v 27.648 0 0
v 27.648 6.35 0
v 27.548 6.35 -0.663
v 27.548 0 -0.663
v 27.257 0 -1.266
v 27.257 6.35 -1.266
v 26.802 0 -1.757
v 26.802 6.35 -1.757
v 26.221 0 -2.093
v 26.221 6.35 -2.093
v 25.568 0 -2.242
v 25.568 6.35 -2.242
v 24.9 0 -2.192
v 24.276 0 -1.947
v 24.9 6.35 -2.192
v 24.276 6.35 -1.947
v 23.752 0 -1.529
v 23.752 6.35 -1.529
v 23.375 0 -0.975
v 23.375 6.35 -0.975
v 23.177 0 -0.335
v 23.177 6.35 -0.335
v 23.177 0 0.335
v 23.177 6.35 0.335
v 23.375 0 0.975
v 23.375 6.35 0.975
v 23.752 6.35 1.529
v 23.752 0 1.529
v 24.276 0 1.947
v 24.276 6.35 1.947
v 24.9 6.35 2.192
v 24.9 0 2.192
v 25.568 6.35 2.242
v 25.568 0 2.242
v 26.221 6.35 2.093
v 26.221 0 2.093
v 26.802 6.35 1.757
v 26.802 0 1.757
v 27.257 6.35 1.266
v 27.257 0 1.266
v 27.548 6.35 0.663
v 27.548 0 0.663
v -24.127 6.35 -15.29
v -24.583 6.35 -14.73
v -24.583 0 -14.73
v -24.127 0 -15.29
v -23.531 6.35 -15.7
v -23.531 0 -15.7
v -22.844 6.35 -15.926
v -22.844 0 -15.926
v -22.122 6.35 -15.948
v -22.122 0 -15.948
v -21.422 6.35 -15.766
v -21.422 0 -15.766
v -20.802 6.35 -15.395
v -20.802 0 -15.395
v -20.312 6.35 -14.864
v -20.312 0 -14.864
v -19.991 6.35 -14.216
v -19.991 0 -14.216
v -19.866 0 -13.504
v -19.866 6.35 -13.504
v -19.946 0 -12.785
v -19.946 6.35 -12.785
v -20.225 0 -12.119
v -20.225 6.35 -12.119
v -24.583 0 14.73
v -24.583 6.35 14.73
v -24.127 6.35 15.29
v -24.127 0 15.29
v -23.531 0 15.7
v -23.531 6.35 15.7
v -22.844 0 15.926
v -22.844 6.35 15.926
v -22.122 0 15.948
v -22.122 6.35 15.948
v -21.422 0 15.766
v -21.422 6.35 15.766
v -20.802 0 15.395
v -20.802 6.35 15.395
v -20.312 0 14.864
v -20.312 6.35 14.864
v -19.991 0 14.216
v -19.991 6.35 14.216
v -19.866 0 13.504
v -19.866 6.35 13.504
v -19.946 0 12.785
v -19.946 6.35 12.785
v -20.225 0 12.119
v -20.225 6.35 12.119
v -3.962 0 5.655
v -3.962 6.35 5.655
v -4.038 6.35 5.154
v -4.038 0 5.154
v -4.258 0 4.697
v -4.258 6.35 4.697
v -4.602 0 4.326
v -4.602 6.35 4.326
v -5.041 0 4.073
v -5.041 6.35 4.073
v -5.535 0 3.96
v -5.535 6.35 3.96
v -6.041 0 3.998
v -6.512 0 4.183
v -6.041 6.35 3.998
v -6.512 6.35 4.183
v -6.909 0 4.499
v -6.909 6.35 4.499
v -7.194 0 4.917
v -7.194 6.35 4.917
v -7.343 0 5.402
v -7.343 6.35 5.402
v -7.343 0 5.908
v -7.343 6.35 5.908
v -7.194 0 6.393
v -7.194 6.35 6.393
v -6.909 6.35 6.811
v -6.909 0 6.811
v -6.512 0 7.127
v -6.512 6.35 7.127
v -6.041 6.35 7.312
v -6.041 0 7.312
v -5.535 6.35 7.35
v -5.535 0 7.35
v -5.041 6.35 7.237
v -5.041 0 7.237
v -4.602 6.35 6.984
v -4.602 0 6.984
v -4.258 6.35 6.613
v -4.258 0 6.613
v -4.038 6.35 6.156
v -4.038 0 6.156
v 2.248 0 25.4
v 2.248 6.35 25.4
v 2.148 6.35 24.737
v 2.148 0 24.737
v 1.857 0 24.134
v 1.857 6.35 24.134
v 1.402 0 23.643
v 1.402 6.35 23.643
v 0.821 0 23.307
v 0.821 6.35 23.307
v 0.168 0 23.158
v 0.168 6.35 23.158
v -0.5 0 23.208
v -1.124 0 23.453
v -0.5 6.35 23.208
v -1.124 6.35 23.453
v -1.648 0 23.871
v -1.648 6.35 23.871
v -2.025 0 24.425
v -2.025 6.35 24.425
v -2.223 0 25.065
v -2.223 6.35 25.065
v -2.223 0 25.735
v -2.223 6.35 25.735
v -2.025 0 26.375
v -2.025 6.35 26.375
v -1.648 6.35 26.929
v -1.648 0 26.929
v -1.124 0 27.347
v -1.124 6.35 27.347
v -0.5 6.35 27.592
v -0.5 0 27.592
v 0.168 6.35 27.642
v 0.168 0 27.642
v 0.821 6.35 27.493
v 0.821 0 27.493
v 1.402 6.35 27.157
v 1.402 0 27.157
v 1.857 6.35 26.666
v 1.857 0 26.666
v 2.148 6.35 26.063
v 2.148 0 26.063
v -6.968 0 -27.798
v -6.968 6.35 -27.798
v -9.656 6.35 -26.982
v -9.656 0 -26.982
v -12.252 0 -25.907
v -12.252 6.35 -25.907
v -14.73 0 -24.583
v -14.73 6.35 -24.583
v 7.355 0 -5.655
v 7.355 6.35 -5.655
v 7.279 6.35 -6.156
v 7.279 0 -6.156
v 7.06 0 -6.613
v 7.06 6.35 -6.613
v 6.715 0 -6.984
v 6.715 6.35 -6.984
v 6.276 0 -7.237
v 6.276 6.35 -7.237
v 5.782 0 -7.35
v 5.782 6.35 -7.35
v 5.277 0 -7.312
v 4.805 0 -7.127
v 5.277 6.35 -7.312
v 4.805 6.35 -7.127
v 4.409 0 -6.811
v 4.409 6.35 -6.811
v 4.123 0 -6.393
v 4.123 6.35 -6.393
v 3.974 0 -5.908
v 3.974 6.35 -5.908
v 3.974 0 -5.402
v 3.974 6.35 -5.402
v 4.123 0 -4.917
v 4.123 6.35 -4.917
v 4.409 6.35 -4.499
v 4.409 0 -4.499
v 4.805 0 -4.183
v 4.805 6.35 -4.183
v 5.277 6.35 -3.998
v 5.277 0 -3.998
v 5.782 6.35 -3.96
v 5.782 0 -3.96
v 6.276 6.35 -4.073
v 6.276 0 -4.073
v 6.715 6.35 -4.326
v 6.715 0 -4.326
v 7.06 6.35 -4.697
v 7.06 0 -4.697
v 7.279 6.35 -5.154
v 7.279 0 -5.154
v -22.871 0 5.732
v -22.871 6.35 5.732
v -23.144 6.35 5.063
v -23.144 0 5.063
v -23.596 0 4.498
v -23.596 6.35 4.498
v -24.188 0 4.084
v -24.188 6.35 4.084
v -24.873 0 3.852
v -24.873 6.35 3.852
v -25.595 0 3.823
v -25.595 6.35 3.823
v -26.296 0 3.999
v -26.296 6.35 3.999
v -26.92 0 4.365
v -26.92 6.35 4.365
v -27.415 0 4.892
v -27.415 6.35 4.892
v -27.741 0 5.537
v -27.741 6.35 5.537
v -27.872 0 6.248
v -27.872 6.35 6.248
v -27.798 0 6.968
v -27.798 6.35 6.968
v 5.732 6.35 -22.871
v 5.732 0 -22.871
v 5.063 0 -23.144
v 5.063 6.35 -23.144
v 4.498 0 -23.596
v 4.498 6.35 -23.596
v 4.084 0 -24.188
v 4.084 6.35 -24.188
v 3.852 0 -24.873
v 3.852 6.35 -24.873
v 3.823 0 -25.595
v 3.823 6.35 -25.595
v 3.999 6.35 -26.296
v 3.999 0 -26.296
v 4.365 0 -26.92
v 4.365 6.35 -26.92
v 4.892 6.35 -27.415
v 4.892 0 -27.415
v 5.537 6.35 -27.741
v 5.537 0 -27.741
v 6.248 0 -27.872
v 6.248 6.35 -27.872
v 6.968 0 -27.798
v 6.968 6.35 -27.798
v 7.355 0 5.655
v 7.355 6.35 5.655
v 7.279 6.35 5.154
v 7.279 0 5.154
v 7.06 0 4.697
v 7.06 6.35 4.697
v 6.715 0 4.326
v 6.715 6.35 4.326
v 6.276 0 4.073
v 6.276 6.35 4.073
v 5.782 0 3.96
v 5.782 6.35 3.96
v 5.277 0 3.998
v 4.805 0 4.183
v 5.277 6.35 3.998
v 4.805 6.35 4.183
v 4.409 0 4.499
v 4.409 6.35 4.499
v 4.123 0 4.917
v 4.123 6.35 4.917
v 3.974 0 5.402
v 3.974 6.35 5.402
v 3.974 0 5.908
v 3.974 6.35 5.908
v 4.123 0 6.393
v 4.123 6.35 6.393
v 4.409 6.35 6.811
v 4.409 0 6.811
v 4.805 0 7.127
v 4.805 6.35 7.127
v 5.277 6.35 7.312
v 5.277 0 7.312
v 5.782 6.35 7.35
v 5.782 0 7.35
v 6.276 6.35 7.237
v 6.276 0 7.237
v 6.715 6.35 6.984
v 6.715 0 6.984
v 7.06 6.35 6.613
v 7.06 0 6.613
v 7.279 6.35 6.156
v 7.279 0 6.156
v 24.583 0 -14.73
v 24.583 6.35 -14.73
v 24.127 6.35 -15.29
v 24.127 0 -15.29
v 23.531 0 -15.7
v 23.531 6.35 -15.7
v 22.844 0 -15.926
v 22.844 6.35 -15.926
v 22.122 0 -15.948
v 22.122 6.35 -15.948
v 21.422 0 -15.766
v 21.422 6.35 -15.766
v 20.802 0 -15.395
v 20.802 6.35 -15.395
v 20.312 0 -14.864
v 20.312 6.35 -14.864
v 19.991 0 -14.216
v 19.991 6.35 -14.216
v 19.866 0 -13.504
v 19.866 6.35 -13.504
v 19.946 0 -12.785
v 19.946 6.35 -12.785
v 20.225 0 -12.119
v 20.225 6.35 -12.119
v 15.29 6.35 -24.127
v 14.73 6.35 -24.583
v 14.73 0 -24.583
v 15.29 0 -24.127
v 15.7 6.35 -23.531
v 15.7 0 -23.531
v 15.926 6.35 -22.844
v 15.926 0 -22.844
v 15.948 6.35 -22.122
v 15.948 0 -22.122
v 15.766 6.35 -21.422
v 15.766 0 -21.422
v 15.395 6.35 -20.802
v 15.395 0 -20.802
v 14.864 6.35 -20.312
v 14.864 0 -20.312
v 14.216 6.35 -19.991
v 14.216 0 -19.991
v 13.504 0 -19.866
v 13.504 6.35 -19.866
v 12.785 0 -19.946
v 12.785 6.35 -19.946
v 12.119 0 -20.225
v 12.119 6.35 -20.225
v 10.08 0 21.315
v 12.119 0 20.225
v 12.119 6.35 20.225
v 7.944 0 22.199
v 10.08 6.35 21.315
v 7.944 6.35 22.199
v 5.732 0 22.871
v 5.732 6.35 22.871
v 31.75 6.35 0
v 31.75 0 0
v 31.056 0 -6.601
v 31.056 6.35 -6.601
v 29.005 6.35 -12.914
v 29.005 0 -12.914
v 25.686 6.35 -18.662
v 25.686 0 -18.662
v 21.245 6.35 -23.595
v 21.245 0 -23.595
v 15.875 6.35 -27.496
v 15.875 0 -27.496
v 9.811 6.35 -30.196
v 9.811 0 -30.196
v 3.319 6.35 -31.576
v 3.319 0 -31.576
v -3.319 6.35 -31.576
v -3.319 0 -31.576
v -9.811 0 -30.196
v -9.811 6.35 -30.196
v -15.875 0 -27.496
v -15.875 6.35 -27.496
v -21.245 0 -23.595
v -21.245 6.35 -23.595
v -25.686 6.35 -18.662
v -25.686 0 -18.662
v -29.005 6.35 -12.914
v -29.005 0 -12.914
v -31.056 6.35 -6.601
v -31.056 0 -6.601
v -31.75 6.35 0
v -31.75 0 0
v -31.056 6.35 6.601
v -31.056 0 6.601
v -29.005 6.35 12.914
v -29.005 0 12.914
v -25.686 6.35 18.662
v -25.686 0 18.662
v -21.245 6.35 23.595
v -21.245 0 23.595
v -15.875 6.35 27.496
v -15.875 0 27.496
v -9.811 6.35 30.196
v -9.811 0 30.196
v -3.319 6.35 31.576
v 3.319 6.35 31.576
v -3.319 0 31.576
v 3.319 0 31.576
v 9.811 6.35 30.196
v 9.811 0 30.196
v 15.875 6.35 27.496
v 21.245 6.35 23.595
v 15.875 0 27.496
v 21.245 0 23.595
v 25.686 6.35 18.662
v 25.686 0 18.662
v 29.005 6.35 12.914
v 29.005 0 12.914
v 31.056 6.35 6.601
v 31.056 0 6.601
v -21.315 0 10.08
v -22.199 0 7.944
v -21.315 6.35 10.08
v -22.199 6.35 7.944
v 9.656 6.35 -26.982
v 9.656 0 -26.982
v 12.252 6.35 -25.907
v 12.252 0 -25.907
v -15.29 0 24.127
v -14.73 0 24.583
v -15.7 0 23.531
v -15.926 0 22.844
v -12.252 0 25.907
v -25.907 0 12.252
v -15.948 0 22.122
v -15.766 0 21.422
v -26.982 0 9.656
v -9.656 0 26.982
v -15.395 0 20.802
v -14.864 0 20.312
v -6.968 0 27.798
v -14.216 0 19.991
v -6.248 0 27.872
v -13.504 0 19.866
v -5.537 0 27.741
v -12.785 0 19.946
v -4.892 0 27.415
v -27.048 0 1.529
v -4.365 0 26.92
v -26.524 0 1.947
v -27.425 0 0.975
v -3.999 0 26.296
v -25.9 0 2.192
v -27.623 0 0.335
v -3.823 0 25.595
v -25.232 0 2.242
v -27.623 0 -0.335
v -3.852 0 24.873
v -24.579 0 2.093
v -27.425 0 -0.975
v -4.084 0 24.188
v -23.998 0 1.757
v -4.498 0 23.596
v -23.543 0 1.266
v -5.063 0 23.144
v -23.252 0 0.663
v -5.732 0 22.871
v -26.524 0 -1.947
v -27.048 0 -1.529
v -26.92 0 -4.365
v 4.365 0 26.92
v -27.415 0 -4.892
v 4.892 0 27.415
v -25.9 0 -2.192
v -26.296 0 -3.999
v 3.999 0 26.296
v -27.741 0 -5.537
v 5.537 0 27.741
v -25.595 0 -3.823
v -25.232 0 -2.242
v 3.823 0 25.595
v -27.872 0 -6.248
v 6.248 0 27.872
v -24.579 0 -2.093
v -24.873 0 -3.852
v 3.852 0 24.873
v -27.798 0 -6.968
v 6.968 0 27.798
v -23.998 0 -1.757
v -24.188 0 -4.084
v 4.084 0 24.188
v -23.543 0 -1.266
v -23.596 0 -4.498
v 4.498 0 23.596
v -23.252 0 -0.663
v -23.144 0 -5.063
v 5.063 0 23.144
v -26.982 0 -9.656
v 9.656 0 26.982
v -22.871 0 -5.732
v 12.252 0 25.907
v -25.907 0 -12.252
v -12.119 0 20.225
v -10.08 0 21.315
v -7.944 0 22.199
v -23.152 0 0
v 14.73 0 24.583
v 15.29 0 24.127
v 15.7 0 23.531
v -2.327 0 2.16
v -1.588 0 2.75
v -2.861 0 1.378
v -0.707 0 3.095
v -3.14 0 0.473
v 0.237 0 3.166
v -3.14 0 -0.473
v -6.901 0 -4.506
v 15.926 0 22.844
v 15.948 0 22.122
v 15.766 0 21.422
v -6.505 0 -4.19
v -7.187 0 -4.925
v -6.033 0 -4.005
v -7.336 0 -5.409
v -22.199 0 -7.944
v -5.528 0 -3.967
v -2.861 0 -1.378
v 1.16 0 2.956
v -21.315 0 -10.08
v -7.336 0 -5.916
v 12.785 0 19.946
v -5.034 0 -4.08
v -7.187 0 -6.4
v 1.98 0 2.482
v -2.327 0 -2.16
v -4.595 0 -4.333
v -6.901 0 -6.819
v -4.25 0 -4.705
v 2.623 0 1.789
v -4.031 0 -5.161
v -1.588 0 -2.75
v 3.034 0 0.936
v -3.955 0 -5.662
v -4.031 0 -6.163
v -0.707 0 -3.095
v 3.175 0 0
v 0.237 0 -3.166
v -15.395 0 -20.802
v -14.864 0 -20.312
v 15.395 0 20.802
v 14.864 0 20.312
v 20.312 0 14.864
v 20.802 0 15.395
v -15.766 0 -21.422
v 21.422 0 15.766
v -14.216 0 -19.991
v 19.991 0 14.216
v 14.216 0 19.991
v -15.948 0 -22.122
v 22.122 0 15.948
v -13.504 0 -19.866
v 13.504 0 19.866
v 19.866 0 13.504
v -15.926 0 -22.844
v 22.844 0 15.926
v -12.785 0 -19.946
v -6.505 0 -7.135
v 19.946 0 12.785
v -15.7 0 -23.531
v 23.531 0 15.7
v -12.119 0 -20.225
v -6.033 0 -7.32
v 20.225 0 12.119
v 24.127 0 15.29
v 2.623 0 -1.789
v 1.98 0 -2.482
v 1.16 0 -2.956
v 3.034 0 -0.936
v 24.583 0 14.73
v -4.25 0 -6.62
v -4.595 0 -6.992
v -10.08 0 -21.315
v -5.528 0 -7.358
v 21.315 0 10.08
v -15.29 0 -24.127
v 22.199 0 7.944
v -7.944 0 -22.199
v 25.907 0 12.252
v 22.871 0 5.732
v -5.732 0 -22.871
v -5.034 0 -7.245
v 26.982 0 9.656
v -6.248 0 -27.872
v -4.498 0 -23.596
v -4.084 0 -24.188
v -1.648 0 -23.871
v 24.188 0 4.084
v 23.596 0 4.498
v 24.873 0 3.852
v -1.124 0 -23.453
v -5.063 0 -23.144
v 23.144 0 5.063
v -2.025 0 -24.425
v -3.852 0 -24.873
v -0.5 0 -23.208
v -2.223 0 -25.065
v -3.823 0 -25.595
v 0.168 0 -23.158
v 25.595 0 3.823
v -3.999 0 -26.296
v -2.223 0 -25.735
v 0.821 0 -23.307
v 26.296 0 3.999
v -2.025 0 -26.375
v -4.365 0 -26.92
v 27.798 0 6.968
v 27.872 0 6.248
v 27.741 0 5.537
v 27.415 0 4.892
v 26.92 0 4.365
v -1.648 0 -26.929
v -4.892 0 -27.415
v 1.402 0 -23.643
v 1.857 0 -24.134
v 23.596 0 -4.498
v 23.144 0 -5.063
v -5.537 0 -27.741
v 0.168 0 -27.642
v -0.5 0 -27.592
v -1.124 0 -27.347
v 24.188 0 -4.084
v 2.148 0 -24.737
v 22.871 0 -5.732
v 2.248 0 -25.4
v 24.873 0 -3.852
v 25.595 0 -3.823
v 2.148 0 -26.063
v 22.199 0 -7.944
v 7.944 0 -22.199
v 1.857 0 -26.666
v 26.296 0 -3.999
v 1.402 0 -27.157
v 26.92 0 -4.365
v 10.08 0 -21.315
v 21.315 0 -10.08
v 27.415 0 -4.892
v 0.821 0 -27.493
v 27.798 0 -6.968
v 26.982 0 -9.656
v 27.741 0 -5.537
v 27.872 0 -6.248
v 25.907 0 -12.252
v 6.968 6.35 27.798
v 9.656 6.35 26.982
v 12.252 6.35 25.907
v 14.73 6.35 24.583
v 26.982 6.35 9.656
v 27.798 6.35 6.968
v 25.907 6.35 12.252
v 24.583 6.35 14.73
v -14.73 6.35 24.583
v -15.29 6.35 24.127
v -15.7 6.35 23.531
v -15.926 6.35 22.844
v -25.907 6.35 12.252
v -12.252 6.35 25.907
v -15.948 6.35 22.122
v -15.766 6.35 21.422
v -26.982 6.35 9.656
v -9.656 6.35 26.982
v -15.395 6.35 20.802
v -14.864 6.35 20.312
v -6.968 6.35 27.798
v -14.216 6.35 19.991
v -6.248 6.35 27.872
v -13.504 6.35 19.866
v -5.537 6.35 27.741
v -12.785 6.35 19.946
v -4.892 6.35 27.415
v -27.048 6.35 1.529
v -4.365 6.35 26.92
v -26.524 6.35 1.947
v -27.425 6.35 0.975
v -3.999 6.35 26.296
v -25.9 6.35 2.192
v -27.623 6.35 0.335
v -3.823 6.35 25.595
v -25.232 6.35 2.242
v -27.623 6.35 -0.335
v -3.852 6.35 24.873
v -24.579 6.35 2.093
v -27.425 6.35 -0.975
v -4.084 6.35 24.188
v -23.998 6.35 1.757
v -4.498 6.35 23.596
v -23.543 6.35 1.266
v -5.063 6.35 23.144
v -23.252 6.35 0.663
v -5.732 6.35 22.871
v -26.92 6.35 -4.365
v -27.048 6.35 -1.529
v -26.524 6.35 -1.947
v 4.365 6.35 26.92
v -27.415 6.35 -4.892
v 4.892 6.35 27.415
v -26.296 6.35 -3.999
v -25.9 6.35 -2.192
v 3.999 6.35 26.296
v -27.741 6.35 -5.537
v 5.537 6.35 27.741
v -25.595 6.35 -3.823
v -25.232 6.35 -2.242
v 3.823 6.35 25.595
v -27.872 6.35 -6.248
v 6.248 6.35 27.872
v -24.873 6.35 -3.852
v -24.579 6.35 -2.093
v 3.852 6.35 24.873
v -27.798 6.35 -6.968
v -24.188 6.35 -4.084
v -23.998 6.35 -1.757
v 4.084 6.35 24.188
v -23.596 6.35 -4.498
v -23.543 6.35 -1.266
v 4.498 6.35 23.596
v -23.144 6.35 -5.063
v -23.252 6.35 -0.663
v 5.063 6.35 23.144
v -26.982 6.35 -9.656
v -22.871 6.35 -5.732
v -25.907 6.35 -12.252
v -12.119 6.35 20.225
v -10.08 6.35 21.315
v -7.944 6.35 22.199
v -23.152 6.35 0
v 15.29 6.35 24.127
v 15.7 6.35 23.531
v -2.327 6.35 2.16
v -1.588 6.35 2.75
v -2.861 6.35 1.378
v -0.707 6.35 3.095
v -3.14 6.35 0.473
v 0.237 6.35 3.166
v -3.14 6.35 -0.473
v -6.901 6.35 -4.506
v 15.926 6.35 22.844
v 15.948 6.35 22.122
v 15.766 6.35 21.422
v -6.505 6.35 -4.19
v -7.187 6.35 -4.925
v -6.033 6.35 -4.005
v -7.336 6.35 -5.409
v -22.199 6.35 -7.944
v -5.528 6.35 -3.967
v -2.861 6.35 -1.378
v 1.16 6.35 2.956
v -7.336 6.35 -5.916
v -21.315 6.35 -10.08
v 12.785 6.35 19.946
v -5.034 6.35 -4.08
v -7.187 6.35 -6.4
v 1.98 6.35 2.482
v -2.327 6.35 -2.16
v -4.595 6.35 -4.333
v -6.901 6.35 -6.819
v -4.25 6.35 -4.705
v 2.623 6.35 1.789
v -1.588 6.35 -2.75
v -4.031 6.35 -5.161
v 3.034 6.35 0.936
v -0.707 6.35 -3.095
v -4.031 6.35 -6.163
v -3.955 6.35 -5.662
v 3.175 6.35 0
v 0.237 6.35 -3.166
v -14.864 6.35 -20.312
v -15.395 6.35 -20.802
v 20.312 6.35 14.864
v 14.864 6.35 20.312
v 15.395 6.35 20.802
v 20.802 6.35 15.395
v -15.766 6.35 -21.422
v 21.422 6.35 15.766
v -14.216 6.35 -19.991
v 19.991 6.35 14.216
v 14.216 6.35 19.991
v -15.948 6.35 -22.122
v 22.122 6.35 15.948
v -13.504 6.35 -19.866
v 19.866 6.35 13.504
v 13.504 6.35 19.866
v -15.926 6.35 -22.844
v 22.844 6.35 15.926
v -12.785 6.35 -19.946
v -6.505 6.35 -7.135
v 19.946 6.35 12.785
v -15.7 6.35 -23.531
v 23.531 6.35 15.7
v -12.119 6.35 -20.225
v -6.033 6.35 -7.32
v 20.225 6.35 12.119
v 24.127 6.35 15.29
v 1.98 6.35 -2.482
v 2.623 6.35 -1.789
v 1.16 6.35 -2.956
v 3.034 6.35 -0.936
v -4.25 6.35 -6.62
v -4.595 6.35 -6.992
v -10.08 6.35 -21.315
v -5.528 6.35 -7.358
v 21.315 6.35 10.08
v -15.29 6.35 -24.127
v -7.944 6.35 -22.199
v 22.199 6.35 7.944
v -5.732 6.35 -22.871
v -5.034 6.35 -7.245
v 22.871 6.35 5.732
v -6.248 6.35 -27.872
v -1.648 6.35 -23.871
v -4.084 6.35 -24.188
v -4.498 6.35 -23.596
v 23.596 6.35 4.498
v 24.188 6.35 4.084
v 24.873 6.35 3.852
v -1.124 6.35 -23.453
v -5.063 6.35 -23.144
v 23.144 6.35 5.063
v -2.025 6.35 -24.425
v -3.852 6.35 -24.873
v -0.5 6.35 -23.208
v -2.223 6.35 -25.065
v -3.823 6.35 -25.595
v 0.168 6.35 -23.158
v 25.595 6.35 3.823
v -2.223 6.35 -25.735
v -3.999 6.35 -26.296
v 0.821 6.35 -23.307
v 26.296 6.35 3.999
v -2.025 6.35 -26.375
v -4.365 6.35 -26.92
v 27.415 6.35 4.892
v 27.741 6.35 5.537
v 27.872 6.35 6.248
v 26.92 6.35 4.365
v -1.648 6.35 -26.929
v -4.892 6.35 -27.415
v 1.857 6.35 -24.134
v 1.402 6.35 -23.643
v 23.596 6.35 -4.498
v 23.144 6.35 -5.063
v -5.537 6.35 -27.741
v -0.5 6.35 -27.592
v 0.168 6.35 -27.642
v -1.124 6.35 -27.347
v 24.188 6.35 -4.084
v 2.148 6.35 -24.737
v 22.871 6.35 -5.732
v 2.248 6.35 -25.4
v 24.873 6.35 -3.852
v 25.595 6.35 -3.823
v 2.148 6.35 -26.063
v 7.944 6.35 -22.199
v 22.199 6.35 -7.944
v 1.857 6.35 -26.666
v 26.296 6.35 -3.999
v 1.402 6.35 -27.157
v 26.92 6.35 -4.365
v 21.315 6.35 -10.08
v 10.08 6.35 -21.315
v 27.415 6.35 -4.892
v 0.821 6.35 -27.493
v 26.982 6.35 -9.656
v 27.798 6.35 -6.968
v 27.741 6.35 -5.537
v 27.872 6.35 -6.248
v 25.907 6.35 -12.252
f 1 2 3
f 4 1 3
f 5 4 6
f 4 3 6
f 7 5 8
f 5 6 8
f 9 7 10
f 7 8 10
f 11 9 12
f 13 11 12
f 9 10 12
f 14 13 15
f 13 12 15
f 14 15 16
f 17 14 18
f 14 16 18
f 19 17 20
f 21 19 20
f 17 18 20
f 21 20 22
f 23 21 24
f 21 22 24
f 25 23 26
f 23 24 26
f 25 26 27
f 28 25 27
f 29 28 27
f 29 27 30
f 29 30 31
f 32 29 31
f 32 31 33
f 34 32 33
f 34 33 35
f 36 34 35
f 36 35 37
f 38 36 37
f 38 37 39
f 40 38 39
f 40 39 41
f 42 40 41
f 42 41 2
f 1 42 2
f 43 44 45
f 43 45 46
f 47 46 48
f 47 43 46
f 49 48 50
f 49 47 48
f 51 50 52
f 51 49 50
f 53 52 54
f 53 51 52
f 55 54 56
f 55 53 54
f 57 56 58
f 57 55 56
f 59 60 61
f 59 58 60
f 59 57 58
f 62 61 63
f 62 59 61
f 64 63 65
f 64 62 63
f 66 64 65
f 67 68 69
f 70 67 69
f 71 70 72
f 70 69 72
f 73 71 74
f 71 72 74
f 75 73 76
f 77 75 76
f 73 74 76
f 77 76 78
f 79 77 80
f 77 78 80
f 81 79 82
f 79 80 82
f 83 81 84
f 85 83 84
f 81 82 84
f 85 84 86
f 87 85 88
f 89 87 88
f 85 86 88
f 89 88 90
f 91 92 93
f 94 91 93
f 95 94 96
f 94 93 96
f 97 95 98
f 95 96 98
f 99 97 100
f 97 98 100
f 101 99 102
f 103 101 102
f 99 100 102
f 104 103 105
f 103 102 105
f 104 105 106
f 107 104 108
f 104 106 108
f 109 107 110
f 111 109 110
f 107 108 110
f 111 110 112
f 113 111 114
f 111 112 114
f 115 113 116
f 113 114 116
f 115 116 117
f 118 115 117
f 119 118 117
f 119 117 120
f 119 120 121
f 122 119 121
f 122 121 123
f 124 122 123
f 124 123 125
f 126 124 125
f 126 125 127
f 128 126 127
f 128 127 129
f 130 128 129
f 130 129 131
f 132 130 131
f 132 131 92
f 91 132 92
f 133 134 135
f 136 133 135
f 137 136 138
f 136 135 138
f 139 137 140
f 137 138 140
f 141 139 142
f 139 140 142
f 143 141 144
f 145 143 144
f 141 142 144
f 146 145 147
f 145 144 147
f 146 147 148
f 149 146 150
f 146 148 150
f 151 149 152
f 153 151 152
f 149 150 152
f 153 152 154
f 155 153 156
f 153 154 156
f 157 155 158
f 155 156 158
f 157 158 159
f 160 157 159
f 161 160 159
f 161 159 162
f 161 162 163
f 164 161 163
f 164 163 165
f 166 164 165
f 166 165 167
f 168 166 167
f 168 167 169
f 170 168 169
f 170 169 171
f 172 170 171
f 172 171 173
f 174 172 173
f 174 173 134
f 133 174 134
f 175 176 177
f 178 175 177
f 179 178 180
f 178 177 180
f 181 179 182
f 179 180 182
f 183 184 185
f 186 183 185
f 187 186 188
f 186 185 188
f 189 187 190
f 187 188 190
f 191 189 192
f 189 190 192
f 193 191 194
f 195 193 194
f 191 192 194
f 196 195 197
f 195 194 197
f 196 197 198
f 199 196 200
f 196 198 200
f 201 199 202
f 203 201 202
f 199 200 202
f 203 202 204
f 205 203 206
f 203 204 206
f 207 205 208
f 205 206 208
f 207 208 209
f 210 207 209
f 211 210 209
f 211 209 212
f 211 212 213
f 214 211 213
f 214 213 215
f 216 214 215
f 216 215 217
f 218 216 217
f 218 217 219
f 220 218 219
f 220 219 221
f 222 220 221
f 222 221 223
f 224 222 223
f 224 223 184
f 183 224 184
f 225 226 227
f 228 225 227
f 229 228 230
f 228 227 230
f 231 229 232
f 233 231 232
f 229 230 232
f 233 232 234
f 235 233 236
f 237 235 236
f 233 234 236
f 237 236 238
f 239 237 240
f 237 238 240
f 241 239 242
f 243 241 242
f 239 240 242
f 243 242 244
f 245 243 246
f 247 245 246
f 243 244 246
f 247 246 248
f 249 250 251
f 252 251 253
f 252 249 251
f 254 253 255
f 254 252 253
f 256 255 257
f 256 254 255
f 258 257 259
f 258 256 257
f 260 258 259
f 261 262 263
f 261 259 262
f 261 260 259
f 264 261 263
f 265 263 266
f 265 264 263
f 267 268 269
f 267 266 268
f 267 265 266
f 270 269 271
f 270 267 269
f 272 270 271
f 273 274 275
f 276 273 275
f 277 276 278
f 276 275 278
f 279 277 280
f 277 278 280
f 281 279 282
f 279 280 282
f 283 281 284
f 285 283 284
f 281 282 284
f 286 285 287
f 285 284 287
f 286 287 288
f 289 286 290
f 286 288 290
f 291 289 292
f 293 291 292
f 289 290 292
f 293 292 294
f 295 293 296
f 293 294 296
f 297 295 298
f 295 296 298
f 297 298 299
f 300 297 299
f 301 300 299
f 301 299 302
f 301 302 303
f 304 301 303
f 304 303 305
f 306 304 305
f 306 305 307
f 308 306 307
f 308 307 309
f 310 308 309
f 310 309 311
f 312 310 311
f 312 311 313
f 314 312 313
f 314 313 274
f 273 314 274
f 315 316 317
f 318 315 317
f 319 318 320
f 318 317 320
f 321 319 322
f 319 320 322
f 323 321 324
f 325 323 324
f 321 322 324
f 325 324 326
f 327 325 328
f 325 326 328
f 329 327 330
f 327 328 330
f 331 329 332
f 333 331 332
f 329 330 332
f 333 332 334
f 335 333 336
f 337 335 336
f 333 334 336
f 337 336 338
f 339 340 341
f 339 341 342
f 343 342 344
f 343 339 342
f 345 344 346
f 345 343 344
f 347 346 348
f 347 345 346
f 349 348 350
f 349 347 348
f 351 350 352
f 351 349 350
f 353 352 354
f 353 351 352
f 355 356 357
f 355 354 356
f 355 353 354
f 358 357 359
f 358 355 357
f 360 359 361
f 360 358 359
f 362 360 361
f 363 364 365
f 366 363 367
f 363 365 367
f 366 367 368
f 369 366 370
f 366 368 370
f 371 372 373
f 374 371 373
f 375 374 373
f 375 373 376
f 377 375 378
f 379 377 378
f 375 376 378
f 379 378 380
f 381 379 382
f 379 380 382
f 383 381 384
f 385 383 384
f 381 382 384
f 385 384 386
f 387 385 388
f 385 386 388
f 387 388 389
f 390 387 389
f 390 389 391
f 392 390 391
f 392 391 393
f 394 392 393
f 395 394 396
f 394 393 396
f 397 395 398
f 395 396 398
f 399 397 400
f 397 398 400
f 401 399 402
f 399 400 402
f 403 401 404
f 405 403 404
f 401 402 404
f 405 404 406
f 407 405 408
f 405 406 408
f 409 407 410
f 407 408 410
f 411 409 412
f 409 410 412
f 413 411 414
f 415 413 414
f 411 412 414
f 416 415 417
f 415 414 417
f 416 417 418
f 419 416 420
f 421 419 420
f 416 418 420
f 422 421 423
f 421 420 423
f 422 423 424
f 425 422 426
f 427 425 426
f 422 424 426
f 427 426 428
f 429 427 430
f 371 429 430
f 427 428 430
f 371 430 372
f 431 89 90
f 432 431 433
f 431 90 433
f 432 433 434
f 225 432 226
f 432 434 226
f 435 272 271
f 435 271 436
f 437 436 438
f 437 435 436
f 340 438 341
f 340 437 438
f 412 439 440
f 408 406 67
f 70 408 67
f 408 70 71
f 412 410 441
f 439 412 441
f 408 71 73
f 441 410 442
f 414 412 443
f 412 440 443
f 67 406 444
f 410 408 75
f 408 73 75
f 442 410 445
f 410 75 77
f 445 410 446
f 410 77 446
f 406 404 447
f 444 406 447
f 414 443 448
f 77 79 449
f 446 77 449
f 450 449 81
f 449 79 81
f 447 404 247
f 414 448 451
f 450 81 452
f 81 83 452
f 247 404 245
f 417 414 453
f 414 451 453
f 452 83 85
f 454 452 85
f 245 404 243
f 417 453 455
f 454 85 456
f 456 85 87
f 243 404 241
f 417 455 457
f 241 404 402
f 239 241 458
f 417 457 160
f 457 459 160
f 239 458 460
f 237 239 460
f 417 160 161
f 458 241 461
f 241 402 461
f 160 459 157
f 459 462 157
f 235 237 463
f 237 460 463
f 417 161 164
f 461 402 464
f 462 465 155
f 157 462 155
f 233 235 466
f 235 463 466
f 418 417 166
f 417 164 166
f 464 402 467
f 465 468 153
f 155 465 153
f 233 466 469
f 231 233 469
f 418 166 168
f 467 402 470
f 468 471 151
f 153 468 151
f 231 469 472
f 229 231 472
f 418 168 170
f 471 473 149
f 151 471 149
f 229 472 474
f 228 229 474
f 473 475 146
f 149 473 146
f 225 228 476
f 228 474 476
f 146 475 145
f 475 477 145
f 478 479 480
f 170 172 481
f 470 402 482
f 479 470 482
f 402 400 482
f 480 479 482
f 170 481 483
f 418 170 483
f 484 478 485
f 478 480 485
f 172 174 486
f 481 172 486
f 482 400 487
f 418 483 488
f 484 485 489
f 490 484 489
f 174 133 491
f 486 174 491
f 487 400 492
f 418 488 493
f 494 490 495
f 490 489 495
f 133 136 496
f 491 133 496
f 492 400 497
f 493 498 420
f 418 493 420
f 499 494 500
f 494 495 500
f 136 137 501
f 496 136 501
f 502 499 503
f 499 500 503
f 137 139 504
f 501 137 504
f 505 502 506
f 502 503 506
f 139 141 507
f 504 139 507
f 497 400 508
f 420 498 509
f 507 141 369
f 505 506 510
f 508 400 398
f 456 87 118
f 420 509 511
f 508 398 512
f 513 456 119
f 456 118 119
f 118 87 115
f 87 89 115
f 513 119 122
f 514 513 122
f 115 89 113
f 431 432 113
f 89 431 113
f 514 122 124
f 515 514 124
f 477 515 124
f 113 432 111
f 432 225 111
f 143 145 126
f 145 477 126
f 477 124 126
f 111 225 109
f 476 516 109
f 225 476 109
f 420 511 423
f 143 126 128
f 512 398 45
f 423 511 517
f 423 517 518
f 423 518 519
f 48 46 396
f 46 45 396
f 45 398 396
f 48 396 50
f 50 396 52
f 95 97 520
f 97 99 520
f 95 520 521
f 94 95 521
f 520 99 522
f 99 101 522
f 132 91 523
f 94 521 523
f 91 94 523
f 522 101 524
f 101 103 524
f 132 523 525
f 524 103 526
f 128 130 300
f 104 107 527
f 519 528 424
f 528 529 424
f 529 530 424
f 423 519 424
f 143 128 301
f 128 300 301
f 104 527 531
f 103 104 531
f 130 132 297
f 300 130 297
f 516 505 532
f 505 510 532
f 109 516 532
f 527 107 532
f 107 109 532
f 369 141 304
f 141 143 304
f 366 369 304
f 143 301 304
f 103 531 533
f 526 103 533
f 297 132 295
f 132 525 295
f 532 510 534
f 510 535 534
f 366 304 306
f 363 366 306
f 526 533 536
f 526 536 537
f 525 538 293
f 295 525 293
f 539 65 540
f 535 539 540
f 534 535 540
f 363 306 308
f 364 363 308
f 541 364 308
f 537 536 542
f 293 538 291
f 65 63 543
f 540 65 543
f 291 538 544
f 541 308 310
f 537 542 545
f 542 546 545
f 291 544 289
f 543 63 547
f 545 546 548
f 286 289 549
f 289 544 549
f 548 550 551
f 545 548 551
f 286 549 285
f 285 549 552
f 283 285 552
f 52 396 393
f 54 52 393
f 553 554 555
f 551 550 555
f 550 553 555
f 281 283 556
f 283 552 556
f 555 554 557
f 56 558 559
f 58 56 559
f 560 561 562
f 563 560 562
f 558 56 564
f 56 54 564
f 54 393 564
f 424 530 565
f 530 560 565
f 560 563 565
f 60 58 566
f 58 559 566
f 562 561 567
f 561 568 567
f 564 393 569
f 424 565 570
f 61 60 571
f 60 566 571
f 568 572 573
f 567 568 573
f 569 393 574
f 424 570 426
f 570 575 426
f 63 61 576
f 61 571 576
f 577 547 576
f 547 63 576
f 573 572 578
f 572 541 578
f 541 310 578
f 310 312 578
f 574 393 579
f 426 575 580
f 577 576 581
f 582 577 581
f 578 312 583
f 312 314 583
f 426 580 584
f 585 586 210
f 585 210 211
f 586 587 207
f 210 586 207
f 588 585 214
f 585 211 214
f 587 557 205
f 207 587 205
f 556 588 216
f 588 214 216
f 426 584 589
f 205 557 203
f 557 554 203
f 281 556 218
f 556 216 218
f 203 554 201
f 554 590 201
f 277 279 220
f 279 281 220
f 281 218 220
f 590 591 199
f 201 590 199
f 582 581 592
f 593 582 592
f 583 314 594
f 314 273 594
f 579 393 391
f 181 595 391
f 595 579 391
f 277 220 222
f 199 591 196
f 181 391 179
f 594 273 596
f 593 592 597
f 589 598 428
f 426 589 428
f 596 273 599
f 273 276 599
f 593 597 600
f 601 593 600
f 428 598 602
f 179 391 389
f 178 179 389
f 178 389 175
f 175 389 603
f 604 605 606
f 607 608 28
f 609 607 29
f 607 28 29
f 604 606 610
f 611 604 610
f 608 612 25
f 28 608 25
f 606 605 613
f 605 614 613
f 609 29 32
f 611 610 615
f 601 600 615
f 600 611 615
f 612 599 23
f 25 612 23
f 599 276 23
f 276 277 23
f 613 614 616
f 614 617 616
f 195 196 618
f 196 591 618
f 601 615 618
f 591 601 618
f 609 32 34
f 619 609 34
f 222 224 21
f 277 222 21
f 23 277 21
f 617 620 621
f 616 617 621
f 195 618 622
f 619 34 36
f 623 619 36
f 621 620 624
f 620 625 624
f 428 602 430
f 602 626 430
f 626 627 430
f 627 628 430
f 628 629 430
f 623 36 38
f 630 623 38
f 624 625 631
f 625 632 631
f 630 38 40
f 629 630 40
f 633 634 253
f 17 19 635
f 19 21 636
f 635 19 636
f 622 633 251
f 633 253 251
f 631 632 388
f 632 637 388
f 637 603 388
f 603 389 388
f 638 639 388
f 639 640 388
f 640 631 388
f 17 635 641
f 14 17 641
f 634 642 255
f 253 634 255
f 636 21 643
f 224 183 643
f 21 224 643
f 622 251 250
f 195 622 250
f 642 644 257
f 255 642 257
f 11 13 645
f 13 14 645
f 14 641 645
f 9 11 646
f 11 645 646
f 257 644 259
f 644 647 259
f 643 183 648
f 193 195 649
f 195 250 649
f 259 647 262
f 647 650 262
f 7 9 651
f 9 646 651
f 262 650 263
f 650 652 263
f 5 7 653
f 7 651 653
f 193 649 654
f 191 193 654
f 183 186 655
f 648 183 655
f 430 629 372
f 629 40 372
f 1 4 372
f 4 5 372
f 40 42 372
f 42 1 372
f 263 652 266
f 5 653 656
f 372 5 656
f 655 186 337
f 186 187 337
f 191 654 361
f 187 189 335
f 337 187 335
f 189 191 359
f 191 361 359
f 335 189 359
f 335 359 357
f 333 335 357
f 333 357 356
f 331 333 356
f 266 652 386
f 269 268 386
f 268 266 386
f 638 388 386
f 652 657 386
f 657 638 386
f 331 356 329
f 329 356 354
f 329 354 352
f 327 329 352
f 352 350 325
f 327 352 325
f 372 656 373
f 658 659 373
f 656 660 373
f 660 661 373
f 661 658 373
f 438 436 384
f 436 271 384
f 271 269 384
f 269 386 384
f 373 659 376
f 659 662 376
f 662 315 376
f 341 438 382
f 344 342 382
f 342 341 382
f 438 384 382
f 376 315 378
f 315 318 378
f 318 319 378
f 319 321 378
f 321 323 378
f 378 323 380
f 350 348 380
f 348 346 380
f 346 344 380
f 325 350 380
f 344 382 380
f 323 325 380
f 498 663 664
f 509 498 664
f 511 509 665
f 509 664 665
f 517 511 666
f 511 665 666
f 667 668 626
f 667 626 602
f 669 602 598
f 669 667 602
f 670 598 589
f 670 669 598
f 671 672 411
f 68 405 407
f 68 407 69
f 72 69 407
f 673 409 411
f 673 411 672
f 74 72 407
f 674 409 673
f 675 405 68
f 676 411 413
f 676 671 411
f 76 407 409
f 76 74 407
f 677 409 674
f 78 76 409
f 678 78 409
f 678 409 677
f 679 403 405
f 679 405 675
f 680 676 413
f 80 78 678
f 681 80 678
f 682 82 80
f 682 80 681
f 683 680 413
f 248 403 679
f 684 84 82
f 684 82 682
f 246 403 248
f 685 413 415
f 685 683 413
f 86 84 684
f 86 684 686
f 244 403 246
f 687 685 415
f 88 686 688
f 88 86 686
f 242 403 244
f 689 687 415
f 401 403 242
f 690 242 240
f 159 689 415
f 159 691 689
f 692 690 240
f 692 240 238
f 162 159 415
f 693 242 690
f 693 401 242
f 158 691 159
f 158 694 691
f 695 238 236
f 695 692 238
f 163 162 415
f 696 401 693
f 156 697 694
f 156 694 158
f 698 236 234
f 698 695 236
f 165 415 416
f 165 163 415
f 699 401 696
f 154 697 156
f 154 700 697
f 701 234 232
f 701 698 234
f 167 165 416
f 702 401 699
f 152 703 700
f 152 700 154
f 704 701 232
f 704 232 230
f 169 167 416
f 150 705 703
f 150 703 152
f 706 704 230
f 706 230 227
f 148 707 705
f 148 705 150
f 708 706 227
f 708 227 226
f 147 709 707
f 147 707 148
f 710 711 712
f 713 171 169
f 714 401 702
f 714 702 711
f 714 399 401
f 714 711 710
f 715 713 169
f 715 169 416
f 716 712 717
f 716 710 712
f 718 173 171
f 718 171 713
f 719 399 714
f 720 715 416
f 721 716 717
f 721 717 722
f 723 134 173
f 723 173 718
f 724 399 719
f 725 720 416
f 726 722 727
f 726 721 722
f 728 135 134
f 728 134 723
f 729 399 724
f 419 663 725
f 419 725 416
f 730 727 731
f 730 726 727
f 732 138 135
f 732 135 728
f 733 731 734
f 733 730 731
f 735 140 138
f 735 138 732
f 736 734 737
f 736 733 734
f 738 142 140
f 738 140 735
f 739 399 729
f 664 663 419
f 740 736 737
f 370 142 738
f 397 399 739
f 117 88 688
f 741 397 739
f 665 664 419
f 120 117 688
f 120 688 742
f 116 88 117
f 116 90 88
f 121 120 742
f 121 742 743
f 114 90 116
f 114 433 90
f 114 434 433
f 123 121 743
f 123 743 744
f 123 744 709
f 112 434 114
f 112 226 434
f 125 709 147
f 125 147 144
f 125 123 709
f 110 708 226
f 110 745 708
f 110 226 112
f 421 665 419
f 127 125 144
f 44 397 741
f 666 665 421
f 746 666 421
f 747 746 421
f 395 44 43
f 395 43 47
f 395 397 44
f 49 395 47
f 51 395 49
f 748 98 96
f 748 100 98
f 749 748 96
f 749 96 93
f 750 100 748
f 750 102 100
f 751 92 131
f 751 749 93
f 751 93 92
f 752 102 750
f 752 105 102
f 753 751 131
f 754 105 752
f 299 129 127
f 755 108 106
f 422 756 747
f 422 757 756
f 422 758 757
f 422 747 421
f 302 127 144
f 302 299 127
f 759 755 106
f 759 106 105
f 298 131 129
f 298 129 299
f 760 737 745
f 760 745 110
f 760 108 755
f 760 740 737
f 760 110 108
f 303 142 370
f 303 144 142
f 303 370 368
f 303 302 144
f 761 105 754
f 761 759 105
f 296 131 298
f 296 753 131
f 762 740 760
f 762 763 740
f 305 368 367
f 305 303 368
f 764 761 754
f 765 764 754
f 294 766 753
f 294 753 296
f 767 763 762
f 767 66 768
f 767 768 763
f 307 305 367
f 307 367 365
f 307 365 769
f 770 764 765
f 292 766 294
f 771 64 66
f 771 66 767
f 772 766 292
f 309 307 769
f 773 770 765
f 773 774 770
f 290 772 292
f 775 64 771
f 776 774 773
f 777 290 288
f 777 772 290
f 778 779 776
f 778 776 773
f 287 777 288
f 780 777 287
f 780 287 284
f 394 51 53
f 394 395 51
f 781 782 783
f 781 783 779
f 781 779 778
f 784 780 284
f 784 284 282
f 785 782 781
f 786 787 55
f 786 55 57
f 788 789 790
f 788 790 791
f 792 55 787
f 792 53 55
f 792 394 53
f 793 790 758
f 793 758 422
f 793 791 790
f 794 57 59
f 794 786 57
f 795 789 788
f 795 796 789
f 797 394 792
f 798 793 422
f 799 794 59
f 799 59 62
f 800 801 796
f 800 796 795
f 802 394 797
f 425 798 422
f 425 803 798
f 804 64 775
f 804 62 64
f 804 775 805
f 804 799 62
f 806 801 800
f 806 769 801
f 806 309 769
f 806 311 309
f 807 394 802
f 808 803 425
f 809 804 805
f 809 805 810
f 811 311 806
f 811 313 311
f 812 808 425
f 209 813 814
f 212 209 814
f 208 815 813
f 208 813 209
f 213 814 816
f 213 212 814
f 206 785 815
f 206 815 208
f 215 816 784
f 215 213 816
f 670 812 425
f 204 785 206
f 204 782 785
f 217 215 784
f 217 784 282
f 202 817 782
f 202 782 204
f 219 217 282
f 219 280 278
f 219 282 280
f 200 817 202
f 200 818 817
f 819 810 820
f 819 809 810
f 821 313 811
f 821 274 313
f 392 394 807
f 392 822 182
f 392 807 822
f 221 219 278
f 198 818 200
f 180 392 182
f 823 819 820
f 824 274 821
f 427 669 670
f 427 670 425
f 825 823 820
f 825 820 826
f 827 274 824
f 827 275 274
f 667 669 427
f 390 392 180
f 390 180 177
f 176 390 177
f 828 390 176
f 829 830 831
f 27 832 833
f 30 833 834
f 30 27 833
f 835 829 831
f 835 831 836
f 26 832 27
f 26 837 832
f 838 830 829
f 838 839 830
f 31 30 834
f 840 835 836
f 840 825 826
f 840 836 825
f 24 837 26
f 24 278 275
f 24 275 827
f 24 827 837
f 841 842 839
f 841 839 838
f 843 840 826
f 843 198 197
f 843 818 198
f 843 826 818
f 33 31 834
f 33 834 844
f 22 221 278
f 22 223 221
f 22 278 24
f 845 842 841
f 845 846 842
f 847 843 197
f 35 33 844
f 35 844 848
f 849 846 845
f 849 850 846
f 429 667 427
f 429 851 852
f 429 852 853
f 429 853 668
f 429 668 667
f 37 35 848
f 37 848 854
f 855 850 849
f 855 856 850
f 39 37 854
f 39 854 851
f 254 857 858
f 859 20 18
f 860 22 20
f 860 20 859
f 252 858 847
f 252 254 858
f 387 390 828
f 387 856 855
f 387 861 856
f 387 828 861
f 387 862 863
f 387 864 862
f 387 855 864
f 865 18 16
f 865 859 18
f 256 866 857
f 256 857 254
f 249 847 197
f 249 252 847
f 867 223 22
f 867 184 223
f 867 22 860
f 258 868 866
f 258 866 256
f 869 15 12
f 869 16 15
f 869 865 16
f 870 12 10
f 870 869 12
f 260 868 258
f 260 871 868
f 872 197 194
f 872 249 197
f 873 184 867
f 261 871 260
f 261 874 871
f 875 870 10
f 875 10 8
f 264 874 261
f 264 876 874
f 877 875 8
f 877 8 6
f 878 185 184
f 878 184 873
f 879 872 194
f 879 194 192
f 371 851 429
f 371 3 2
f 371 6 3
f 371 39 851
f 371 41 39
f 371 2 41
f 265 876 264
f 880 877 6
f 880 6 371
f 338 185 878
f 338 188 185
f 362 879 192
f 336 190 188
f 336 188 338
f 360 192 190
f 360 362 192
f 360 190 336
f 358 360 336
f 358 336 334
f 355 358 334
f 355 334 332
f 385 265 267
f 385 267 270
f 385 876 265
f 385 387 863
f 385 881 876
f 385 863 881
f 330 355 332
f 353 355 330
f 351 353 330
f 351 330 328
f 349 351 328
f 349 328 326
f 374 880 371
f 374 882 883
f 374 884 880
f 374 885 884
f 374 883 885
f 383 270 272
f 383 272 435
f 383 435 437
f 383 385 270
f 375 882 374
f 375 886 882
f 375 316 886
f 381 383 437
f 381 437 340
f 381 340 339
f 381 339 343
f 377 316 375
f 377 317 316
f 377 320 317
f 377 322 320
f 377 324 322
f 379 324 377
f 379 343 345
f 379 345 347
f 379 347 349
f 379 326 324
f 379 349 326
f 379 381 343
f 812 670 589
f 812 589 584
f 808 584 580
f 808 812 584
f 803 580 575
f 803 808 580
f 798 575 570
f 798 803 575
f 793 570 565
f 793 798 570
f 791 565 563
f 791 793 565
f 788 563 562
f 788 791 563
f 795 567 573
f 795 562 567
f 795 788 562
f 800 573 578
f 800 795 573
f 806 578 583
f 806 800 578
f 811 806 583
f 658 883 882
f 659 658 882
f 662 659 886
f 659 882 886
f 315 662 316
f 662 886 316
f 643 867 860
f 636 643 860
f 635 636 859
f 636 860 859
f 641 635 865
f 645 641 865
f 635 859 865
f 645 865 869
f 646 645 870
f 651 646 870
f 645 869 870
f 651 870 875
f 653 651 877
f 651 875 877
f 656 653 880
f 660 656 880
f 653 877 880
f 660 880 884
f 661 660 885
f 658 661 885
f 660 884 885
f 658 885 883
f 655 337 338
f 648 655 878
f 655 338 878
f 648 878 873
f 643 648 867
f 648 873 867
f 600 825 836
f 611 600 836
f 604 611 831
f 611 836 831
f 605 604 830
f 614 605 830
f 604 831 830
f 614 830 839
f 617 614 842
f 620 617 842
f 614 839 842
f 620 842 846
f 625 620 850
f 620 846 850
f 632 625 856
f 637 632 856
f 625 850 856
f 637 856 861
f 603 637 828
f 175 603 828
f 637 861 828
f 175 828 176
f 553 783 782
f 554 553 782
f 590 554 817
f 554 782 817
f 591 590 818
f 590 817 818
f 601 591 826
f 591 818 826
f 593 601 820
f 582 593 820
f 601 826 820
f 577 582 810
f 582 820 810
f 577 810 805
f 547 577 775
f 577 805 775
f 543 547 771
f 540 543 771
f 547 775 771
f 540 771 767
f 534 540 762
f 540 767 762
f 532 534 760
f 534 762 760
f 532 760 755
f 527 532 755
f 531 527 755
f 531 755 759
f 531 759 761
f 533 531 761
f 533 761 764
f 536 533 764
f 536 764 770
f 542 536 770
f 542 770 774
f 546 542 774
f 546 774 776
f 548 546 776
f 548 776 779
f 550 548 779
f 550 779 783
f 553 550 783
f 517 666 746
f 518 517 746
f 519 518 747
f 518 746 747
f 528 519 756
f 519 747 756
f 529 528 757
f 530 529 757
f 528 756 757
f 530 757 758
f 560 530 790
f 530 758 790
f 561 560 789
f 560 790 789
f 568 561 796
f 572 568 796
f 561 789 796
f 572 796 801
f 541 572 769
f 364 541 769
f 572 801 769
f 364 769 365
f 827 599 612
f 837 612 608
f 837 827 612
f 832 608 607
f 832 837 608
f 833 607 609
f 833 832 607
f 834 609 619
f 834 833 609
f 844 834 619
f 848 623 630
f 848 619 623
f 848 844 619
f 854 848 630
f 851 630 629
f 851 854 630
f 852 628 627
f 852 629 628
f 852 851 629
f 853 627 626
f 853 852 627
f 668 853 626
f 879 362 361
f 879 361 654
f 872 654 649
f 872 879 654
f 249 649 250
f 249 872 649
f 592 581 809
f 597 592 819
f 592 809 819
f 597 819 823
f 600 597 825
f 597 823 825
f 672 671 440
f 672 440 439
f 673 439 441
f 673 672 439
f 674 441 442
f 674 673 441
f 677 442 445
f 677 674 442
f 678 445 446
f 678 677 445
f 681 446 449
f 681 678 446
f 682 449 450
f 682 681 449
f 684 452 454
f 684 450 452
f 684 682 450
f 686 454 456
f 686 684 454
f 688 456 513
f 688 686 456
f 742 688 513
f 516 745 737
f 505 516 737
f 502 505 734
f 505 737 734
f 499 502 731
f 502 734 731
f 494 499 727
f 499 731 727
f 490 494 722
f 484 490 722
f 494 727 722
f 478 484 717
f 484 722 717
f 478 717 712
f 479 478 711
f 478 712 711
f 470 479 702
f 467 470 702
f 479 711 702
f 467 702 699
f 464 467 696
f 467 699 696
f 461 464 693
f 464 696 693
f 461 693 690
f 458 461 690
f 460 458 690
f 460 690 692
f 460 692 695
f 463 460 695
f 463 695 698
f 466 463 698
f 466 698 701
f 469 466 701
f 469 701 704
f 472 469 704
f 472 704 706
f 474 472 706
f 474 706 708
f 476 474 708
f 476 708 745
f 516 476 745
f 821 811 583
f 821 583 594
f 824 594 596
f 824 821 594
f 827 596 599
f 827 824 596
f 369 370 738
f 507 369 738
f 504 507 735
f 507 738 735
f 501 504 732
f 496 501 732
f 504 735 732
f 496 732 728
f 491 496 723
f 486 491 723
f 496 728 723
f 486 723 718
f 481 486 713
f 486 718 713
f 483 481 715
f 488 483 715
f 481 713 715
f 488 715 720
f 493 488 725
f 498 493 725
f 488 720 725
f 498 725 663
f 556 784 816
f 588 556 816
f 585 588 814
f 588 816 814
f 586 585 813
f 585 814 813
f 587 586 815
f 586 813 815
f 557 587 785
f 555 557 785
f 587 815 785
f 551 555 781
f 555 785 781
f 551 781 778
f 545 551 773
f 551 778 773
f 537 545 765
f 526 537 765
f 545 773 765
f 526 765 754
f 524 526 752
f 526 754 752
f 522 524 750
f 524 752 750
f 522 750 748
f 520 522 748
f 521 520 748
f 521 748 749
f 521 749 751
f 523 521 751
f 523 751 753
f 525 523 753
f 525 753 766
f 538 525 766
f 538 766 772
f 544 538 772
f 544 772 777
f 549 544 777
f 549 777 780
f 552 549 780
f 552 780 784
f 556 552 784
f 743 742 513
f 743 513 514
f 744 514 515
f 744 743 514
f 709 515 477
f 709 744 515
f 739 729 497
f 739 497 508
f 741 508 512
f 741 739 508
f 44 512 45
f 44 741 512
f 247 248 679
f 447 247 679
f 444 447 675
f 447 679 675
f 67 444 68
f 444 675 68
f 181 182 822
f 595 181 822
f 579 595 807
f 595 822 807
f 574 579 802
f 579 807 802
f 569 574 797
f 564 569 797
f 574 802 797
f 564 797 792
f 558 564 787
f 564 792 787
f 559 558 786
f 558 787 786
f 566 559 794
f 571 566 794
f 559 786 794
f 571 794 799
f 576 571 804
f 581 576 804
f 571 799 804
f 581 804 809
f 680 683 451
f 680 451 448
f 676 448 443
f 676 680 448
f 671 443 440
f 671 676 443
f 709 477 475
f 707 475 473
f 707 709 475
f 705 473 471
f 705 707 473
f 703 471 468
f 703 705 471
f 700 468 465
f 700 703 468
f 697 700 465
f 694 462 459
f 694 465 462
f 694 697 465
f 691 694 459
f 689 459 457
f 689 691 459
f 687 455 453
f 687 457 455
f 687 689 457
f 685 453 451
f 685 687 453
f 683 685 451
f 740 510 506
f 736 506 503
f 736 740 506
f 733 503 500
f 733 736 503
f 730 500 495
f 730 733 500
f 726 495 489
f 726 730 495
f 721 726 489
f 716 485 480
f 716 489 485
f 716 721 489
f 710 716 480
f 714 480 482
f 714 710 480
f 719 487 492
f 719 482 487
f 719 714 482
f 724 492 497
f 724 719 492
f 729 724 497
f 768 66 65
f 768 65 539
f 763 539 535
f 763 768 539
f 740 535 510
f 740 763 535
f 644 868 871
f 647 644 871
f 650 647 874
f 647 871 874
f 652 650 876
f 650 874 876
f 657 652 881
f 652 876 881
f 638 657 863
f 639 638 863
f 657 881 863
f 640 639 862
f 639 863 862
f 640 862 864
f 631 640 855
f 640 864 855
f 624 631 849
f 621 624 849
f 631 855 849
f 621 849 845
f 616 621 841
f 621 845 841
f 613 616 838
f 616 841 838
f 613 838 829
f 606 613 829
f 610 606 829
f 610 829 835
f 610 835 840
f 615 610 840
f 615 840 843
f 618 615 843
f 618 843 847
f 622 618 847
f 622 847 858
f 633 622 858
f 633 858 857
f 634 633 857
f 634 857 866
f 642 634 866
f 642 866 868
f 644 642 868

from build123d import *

# Parameters (mm, degrees)
SKETCH1_R           = 31.75
BOSS_EXTRUDE1_DEPTH = 6.35
SKETCH2_R           = 3.175
SKETCH2_R_2         = 1.7
CUT_EXTRUDE1_DEPTH  = 7.35
CUT_EXTRUDE2_DEPTH  = 7.35
SKETCH4_R           = 2.2479
CUT_EXTRUDE3_DEPTH  = 7.35


with BuildPart() as part:
    # Sketch1 → Boss-Extrude1 (new body)
    with BuildSketch(Plane(origin=(0, 0, 0), x_dir=(1, 0, 0), z_dir=(0, 1, 0))):
        Circle(SKETCH1_R)
    extrude(amount=BOSS_EXTRUDE1_DEPTH)

    # Sketch2 → Cut-Extrude1 (cut, through all)
    with BuildSketch(Plane(origin=(0, 6.35, 0), x_dir=(1, 0, 0), z_dir=(0, 1, 0))):
        Circle(SKETCH2_R)
        with Locations((-5.655, 5.662415783)):
            Circle(SKETCH2_R_2)
        with Locations((5.655, 5.655)):
            Circle(SKETCH2_R_2)
        with Locations((5.655, -5.655)):
            Circle(SKETCH2_R_2)
        with Locations((-5.662415783, -5.655)):
            Circle(SKETCH2_R_2)
    extrude(amount=-CUT_EXTRUDE1_DEPTH, mode=Mode.SUBTRACT)

    # Sketch3 → Cut-Extrude2 (cut, through all)
    with BuildSketch(Plane(origin=(0, 6.35, 0), x_dir=(1, 0, 0), z_dir=(0, 1, 0))):
        with BuildLine():
            ThreePointArc((-6.96754053, 27.798227251), (-10.966989178, 26.476654013), (-14.729519838, 24.583110151))
            ThreePointArc((-14.729519838, 24.583110151), (-15.60285403, 21.098789932), (-12.118533811, 20.22545574))
            ThreePointArc((-12.118533811, 20.22545574), (-9.022957342, 21.783345987), (-5.73245947, 22.870654342))
            ThreePointArc((-5.73245947, 22.870654342), (-3.886213545, 25.951981326), (-6.96754053, 27.798227251))
        make_face()
        with BuildLine():
            ThreePointArc((-27.798227251, 6.96754053), (-26.476654013, 10.966989178), (-24.583110151, 14.729519838))
            ThreePointArc((-24.583110151, 14.729519838), (-21.098789932, 15.60285403), (-20.22545574, 12.118533811))
            ThreePointArc((-20.22545574, 12.118533811), (-21.783345987, 9.022957342), (-22.870654342, 5.73245947))
            ThreePointArc((-22.870654342, 5.73245947), (-25.951981326, 3.886213545), (-27.798227251, 6.96754053))
        make_face()
        with BuildLine():
            ThreePointArc((-27.798227251, -6.96754053), (-26.476654013, -10.966989178), (-24.583110151, -14.729519838))
            ThreePointArc((-24.583110151, -14.729519838), (-21.098789932, -15.60285403), (-20.22545574, -12.118533811))
            ThreePointArc((-20.22545574, -12.118533811), (-21.783345987, -9.022957342), (-22.870654342, -5.73245947))
            ThreePointArc((-22.870654342, -5.73245947), (-25.951981326, -3.886213545), (-27.798227251, -6.96754053))
        make_face()
        with BuildLine():
            ThreePointArc((-6.96754053, -27.798227251), (-10.966989178, -26.476654013), (-14.729519838, -24.583110151))
            ThreePointArc((-14.729519838, -24.583110151), (-15.60285403, -21.098789932), (-12.118533811, -20.22545574))
            ThreePointArc((-12.118533811, -20.22545574), (-9.022957342, -21.783345987), (-5.73245947, -22.870654342))
            ThreePointArc((-5.73245947, -22.870654342), (-3.886213545, -25.951981326), (-6.96754053, -27.798227251))
        make_face()
        with BuildLine():
            ThreePointArc((6.96754053, -27.798227251), (10.966989178, -26.476654013), (14.729519838, -24.583110151))
            ThreePointArc((14.729519838, -24.583110151), (15.60285403, -21.098789932), (12.118533811, -20.22545574))
            ThreePointArc((12.118533811, -20.22545574), (9.022957342, -21.783345987), (5.73245947, -22.870654342))
            ThreePointArc((5.73245947, -22.870654342), (3.886213545, -25.951981326), (6.96754053, -27.798227251))
        make_face()
        with BuildLine():
            ThreePointArc((27.798227251, -6.96754053), (26.476654013, -10.966989178), (24.583110151, -14.729519838))
            ThreePointArc((24.583110151, -14.729519838), (21.098789932, -15.60285403), (20.22545574, -12.118533811))
            ThreePointArc((20.22545574, -12.118533811), (21.783345987, -9.022957342), (22.870654342, -5.73245947))
            ThreePointArc((22.870654342, -5.73245947), (25.951981326, -3.886213545), (27.798227251, -6.96754053))
        make_face()
        with BuildLine():
            ThreePointArc((27.798227251, 6.96754053), (26.476654013, 10.966989178), (24.583110151, 14.729519838))
            ThreePointArc((24.583110151, 14.729519838), (21.098789932, 15.60285403), (20.22545574, 12.118533811))
            ThreePointArc((20.22545574, 12.118533811), (21.783345987, 9.022957342), (22.870654342, 5.73245947))
            ThreePointArc((22.870654342, 5.73245947), (25.951981326, 3.886213545), (27.798227251, 6.96754053))
        make_face()
        with BuildLine():
            ThreePointArc((6.96754053, 27.798227251), (10.966989178, 26.476654013), (14.729519838, 24.583110151))
            ThreePointArc((14.729519838, 24.583110151), (15.60285403, 21.098789932), (12.118533811, 20.22545574))
            ThreePointArc((12.118533811, 20.22545574), (9.022957342, 21.783345987), (5.73245947, 22.870654342))
            ThreePointArc((5.73245947, 22.870654342), (3.886213545, 25.951981326), (6.96754053, 27.798227251))
        make_face()
    extrude(amount=-CUT_EXTRUDE2_DEPTH, mode=Mode.SUBTRACT)

    # Sketch4 → Cut-Extrude3 (cut, through all)
    with BuildSketch(Plane(origin=(0, 6.35, 0), x_dir=(1, 0, 0), z_dir=(0, 1, 0))):
        with Locations((0, -25.4)):
            Circle(SKETCH4_R)
        with Locations((25.4, 0)):
            Circle(SKETCH4_R)
        with Locations((-25.4, 0)):
            Circle(SKETCH4_R)
        with Locations((0, 25.4)):
            Circle(SKETCH4_R)
    extrude(amount=-CUT_EXTRUDE3_DEPTH, mode=Mode.SUBTRACT)


solid = part.part
